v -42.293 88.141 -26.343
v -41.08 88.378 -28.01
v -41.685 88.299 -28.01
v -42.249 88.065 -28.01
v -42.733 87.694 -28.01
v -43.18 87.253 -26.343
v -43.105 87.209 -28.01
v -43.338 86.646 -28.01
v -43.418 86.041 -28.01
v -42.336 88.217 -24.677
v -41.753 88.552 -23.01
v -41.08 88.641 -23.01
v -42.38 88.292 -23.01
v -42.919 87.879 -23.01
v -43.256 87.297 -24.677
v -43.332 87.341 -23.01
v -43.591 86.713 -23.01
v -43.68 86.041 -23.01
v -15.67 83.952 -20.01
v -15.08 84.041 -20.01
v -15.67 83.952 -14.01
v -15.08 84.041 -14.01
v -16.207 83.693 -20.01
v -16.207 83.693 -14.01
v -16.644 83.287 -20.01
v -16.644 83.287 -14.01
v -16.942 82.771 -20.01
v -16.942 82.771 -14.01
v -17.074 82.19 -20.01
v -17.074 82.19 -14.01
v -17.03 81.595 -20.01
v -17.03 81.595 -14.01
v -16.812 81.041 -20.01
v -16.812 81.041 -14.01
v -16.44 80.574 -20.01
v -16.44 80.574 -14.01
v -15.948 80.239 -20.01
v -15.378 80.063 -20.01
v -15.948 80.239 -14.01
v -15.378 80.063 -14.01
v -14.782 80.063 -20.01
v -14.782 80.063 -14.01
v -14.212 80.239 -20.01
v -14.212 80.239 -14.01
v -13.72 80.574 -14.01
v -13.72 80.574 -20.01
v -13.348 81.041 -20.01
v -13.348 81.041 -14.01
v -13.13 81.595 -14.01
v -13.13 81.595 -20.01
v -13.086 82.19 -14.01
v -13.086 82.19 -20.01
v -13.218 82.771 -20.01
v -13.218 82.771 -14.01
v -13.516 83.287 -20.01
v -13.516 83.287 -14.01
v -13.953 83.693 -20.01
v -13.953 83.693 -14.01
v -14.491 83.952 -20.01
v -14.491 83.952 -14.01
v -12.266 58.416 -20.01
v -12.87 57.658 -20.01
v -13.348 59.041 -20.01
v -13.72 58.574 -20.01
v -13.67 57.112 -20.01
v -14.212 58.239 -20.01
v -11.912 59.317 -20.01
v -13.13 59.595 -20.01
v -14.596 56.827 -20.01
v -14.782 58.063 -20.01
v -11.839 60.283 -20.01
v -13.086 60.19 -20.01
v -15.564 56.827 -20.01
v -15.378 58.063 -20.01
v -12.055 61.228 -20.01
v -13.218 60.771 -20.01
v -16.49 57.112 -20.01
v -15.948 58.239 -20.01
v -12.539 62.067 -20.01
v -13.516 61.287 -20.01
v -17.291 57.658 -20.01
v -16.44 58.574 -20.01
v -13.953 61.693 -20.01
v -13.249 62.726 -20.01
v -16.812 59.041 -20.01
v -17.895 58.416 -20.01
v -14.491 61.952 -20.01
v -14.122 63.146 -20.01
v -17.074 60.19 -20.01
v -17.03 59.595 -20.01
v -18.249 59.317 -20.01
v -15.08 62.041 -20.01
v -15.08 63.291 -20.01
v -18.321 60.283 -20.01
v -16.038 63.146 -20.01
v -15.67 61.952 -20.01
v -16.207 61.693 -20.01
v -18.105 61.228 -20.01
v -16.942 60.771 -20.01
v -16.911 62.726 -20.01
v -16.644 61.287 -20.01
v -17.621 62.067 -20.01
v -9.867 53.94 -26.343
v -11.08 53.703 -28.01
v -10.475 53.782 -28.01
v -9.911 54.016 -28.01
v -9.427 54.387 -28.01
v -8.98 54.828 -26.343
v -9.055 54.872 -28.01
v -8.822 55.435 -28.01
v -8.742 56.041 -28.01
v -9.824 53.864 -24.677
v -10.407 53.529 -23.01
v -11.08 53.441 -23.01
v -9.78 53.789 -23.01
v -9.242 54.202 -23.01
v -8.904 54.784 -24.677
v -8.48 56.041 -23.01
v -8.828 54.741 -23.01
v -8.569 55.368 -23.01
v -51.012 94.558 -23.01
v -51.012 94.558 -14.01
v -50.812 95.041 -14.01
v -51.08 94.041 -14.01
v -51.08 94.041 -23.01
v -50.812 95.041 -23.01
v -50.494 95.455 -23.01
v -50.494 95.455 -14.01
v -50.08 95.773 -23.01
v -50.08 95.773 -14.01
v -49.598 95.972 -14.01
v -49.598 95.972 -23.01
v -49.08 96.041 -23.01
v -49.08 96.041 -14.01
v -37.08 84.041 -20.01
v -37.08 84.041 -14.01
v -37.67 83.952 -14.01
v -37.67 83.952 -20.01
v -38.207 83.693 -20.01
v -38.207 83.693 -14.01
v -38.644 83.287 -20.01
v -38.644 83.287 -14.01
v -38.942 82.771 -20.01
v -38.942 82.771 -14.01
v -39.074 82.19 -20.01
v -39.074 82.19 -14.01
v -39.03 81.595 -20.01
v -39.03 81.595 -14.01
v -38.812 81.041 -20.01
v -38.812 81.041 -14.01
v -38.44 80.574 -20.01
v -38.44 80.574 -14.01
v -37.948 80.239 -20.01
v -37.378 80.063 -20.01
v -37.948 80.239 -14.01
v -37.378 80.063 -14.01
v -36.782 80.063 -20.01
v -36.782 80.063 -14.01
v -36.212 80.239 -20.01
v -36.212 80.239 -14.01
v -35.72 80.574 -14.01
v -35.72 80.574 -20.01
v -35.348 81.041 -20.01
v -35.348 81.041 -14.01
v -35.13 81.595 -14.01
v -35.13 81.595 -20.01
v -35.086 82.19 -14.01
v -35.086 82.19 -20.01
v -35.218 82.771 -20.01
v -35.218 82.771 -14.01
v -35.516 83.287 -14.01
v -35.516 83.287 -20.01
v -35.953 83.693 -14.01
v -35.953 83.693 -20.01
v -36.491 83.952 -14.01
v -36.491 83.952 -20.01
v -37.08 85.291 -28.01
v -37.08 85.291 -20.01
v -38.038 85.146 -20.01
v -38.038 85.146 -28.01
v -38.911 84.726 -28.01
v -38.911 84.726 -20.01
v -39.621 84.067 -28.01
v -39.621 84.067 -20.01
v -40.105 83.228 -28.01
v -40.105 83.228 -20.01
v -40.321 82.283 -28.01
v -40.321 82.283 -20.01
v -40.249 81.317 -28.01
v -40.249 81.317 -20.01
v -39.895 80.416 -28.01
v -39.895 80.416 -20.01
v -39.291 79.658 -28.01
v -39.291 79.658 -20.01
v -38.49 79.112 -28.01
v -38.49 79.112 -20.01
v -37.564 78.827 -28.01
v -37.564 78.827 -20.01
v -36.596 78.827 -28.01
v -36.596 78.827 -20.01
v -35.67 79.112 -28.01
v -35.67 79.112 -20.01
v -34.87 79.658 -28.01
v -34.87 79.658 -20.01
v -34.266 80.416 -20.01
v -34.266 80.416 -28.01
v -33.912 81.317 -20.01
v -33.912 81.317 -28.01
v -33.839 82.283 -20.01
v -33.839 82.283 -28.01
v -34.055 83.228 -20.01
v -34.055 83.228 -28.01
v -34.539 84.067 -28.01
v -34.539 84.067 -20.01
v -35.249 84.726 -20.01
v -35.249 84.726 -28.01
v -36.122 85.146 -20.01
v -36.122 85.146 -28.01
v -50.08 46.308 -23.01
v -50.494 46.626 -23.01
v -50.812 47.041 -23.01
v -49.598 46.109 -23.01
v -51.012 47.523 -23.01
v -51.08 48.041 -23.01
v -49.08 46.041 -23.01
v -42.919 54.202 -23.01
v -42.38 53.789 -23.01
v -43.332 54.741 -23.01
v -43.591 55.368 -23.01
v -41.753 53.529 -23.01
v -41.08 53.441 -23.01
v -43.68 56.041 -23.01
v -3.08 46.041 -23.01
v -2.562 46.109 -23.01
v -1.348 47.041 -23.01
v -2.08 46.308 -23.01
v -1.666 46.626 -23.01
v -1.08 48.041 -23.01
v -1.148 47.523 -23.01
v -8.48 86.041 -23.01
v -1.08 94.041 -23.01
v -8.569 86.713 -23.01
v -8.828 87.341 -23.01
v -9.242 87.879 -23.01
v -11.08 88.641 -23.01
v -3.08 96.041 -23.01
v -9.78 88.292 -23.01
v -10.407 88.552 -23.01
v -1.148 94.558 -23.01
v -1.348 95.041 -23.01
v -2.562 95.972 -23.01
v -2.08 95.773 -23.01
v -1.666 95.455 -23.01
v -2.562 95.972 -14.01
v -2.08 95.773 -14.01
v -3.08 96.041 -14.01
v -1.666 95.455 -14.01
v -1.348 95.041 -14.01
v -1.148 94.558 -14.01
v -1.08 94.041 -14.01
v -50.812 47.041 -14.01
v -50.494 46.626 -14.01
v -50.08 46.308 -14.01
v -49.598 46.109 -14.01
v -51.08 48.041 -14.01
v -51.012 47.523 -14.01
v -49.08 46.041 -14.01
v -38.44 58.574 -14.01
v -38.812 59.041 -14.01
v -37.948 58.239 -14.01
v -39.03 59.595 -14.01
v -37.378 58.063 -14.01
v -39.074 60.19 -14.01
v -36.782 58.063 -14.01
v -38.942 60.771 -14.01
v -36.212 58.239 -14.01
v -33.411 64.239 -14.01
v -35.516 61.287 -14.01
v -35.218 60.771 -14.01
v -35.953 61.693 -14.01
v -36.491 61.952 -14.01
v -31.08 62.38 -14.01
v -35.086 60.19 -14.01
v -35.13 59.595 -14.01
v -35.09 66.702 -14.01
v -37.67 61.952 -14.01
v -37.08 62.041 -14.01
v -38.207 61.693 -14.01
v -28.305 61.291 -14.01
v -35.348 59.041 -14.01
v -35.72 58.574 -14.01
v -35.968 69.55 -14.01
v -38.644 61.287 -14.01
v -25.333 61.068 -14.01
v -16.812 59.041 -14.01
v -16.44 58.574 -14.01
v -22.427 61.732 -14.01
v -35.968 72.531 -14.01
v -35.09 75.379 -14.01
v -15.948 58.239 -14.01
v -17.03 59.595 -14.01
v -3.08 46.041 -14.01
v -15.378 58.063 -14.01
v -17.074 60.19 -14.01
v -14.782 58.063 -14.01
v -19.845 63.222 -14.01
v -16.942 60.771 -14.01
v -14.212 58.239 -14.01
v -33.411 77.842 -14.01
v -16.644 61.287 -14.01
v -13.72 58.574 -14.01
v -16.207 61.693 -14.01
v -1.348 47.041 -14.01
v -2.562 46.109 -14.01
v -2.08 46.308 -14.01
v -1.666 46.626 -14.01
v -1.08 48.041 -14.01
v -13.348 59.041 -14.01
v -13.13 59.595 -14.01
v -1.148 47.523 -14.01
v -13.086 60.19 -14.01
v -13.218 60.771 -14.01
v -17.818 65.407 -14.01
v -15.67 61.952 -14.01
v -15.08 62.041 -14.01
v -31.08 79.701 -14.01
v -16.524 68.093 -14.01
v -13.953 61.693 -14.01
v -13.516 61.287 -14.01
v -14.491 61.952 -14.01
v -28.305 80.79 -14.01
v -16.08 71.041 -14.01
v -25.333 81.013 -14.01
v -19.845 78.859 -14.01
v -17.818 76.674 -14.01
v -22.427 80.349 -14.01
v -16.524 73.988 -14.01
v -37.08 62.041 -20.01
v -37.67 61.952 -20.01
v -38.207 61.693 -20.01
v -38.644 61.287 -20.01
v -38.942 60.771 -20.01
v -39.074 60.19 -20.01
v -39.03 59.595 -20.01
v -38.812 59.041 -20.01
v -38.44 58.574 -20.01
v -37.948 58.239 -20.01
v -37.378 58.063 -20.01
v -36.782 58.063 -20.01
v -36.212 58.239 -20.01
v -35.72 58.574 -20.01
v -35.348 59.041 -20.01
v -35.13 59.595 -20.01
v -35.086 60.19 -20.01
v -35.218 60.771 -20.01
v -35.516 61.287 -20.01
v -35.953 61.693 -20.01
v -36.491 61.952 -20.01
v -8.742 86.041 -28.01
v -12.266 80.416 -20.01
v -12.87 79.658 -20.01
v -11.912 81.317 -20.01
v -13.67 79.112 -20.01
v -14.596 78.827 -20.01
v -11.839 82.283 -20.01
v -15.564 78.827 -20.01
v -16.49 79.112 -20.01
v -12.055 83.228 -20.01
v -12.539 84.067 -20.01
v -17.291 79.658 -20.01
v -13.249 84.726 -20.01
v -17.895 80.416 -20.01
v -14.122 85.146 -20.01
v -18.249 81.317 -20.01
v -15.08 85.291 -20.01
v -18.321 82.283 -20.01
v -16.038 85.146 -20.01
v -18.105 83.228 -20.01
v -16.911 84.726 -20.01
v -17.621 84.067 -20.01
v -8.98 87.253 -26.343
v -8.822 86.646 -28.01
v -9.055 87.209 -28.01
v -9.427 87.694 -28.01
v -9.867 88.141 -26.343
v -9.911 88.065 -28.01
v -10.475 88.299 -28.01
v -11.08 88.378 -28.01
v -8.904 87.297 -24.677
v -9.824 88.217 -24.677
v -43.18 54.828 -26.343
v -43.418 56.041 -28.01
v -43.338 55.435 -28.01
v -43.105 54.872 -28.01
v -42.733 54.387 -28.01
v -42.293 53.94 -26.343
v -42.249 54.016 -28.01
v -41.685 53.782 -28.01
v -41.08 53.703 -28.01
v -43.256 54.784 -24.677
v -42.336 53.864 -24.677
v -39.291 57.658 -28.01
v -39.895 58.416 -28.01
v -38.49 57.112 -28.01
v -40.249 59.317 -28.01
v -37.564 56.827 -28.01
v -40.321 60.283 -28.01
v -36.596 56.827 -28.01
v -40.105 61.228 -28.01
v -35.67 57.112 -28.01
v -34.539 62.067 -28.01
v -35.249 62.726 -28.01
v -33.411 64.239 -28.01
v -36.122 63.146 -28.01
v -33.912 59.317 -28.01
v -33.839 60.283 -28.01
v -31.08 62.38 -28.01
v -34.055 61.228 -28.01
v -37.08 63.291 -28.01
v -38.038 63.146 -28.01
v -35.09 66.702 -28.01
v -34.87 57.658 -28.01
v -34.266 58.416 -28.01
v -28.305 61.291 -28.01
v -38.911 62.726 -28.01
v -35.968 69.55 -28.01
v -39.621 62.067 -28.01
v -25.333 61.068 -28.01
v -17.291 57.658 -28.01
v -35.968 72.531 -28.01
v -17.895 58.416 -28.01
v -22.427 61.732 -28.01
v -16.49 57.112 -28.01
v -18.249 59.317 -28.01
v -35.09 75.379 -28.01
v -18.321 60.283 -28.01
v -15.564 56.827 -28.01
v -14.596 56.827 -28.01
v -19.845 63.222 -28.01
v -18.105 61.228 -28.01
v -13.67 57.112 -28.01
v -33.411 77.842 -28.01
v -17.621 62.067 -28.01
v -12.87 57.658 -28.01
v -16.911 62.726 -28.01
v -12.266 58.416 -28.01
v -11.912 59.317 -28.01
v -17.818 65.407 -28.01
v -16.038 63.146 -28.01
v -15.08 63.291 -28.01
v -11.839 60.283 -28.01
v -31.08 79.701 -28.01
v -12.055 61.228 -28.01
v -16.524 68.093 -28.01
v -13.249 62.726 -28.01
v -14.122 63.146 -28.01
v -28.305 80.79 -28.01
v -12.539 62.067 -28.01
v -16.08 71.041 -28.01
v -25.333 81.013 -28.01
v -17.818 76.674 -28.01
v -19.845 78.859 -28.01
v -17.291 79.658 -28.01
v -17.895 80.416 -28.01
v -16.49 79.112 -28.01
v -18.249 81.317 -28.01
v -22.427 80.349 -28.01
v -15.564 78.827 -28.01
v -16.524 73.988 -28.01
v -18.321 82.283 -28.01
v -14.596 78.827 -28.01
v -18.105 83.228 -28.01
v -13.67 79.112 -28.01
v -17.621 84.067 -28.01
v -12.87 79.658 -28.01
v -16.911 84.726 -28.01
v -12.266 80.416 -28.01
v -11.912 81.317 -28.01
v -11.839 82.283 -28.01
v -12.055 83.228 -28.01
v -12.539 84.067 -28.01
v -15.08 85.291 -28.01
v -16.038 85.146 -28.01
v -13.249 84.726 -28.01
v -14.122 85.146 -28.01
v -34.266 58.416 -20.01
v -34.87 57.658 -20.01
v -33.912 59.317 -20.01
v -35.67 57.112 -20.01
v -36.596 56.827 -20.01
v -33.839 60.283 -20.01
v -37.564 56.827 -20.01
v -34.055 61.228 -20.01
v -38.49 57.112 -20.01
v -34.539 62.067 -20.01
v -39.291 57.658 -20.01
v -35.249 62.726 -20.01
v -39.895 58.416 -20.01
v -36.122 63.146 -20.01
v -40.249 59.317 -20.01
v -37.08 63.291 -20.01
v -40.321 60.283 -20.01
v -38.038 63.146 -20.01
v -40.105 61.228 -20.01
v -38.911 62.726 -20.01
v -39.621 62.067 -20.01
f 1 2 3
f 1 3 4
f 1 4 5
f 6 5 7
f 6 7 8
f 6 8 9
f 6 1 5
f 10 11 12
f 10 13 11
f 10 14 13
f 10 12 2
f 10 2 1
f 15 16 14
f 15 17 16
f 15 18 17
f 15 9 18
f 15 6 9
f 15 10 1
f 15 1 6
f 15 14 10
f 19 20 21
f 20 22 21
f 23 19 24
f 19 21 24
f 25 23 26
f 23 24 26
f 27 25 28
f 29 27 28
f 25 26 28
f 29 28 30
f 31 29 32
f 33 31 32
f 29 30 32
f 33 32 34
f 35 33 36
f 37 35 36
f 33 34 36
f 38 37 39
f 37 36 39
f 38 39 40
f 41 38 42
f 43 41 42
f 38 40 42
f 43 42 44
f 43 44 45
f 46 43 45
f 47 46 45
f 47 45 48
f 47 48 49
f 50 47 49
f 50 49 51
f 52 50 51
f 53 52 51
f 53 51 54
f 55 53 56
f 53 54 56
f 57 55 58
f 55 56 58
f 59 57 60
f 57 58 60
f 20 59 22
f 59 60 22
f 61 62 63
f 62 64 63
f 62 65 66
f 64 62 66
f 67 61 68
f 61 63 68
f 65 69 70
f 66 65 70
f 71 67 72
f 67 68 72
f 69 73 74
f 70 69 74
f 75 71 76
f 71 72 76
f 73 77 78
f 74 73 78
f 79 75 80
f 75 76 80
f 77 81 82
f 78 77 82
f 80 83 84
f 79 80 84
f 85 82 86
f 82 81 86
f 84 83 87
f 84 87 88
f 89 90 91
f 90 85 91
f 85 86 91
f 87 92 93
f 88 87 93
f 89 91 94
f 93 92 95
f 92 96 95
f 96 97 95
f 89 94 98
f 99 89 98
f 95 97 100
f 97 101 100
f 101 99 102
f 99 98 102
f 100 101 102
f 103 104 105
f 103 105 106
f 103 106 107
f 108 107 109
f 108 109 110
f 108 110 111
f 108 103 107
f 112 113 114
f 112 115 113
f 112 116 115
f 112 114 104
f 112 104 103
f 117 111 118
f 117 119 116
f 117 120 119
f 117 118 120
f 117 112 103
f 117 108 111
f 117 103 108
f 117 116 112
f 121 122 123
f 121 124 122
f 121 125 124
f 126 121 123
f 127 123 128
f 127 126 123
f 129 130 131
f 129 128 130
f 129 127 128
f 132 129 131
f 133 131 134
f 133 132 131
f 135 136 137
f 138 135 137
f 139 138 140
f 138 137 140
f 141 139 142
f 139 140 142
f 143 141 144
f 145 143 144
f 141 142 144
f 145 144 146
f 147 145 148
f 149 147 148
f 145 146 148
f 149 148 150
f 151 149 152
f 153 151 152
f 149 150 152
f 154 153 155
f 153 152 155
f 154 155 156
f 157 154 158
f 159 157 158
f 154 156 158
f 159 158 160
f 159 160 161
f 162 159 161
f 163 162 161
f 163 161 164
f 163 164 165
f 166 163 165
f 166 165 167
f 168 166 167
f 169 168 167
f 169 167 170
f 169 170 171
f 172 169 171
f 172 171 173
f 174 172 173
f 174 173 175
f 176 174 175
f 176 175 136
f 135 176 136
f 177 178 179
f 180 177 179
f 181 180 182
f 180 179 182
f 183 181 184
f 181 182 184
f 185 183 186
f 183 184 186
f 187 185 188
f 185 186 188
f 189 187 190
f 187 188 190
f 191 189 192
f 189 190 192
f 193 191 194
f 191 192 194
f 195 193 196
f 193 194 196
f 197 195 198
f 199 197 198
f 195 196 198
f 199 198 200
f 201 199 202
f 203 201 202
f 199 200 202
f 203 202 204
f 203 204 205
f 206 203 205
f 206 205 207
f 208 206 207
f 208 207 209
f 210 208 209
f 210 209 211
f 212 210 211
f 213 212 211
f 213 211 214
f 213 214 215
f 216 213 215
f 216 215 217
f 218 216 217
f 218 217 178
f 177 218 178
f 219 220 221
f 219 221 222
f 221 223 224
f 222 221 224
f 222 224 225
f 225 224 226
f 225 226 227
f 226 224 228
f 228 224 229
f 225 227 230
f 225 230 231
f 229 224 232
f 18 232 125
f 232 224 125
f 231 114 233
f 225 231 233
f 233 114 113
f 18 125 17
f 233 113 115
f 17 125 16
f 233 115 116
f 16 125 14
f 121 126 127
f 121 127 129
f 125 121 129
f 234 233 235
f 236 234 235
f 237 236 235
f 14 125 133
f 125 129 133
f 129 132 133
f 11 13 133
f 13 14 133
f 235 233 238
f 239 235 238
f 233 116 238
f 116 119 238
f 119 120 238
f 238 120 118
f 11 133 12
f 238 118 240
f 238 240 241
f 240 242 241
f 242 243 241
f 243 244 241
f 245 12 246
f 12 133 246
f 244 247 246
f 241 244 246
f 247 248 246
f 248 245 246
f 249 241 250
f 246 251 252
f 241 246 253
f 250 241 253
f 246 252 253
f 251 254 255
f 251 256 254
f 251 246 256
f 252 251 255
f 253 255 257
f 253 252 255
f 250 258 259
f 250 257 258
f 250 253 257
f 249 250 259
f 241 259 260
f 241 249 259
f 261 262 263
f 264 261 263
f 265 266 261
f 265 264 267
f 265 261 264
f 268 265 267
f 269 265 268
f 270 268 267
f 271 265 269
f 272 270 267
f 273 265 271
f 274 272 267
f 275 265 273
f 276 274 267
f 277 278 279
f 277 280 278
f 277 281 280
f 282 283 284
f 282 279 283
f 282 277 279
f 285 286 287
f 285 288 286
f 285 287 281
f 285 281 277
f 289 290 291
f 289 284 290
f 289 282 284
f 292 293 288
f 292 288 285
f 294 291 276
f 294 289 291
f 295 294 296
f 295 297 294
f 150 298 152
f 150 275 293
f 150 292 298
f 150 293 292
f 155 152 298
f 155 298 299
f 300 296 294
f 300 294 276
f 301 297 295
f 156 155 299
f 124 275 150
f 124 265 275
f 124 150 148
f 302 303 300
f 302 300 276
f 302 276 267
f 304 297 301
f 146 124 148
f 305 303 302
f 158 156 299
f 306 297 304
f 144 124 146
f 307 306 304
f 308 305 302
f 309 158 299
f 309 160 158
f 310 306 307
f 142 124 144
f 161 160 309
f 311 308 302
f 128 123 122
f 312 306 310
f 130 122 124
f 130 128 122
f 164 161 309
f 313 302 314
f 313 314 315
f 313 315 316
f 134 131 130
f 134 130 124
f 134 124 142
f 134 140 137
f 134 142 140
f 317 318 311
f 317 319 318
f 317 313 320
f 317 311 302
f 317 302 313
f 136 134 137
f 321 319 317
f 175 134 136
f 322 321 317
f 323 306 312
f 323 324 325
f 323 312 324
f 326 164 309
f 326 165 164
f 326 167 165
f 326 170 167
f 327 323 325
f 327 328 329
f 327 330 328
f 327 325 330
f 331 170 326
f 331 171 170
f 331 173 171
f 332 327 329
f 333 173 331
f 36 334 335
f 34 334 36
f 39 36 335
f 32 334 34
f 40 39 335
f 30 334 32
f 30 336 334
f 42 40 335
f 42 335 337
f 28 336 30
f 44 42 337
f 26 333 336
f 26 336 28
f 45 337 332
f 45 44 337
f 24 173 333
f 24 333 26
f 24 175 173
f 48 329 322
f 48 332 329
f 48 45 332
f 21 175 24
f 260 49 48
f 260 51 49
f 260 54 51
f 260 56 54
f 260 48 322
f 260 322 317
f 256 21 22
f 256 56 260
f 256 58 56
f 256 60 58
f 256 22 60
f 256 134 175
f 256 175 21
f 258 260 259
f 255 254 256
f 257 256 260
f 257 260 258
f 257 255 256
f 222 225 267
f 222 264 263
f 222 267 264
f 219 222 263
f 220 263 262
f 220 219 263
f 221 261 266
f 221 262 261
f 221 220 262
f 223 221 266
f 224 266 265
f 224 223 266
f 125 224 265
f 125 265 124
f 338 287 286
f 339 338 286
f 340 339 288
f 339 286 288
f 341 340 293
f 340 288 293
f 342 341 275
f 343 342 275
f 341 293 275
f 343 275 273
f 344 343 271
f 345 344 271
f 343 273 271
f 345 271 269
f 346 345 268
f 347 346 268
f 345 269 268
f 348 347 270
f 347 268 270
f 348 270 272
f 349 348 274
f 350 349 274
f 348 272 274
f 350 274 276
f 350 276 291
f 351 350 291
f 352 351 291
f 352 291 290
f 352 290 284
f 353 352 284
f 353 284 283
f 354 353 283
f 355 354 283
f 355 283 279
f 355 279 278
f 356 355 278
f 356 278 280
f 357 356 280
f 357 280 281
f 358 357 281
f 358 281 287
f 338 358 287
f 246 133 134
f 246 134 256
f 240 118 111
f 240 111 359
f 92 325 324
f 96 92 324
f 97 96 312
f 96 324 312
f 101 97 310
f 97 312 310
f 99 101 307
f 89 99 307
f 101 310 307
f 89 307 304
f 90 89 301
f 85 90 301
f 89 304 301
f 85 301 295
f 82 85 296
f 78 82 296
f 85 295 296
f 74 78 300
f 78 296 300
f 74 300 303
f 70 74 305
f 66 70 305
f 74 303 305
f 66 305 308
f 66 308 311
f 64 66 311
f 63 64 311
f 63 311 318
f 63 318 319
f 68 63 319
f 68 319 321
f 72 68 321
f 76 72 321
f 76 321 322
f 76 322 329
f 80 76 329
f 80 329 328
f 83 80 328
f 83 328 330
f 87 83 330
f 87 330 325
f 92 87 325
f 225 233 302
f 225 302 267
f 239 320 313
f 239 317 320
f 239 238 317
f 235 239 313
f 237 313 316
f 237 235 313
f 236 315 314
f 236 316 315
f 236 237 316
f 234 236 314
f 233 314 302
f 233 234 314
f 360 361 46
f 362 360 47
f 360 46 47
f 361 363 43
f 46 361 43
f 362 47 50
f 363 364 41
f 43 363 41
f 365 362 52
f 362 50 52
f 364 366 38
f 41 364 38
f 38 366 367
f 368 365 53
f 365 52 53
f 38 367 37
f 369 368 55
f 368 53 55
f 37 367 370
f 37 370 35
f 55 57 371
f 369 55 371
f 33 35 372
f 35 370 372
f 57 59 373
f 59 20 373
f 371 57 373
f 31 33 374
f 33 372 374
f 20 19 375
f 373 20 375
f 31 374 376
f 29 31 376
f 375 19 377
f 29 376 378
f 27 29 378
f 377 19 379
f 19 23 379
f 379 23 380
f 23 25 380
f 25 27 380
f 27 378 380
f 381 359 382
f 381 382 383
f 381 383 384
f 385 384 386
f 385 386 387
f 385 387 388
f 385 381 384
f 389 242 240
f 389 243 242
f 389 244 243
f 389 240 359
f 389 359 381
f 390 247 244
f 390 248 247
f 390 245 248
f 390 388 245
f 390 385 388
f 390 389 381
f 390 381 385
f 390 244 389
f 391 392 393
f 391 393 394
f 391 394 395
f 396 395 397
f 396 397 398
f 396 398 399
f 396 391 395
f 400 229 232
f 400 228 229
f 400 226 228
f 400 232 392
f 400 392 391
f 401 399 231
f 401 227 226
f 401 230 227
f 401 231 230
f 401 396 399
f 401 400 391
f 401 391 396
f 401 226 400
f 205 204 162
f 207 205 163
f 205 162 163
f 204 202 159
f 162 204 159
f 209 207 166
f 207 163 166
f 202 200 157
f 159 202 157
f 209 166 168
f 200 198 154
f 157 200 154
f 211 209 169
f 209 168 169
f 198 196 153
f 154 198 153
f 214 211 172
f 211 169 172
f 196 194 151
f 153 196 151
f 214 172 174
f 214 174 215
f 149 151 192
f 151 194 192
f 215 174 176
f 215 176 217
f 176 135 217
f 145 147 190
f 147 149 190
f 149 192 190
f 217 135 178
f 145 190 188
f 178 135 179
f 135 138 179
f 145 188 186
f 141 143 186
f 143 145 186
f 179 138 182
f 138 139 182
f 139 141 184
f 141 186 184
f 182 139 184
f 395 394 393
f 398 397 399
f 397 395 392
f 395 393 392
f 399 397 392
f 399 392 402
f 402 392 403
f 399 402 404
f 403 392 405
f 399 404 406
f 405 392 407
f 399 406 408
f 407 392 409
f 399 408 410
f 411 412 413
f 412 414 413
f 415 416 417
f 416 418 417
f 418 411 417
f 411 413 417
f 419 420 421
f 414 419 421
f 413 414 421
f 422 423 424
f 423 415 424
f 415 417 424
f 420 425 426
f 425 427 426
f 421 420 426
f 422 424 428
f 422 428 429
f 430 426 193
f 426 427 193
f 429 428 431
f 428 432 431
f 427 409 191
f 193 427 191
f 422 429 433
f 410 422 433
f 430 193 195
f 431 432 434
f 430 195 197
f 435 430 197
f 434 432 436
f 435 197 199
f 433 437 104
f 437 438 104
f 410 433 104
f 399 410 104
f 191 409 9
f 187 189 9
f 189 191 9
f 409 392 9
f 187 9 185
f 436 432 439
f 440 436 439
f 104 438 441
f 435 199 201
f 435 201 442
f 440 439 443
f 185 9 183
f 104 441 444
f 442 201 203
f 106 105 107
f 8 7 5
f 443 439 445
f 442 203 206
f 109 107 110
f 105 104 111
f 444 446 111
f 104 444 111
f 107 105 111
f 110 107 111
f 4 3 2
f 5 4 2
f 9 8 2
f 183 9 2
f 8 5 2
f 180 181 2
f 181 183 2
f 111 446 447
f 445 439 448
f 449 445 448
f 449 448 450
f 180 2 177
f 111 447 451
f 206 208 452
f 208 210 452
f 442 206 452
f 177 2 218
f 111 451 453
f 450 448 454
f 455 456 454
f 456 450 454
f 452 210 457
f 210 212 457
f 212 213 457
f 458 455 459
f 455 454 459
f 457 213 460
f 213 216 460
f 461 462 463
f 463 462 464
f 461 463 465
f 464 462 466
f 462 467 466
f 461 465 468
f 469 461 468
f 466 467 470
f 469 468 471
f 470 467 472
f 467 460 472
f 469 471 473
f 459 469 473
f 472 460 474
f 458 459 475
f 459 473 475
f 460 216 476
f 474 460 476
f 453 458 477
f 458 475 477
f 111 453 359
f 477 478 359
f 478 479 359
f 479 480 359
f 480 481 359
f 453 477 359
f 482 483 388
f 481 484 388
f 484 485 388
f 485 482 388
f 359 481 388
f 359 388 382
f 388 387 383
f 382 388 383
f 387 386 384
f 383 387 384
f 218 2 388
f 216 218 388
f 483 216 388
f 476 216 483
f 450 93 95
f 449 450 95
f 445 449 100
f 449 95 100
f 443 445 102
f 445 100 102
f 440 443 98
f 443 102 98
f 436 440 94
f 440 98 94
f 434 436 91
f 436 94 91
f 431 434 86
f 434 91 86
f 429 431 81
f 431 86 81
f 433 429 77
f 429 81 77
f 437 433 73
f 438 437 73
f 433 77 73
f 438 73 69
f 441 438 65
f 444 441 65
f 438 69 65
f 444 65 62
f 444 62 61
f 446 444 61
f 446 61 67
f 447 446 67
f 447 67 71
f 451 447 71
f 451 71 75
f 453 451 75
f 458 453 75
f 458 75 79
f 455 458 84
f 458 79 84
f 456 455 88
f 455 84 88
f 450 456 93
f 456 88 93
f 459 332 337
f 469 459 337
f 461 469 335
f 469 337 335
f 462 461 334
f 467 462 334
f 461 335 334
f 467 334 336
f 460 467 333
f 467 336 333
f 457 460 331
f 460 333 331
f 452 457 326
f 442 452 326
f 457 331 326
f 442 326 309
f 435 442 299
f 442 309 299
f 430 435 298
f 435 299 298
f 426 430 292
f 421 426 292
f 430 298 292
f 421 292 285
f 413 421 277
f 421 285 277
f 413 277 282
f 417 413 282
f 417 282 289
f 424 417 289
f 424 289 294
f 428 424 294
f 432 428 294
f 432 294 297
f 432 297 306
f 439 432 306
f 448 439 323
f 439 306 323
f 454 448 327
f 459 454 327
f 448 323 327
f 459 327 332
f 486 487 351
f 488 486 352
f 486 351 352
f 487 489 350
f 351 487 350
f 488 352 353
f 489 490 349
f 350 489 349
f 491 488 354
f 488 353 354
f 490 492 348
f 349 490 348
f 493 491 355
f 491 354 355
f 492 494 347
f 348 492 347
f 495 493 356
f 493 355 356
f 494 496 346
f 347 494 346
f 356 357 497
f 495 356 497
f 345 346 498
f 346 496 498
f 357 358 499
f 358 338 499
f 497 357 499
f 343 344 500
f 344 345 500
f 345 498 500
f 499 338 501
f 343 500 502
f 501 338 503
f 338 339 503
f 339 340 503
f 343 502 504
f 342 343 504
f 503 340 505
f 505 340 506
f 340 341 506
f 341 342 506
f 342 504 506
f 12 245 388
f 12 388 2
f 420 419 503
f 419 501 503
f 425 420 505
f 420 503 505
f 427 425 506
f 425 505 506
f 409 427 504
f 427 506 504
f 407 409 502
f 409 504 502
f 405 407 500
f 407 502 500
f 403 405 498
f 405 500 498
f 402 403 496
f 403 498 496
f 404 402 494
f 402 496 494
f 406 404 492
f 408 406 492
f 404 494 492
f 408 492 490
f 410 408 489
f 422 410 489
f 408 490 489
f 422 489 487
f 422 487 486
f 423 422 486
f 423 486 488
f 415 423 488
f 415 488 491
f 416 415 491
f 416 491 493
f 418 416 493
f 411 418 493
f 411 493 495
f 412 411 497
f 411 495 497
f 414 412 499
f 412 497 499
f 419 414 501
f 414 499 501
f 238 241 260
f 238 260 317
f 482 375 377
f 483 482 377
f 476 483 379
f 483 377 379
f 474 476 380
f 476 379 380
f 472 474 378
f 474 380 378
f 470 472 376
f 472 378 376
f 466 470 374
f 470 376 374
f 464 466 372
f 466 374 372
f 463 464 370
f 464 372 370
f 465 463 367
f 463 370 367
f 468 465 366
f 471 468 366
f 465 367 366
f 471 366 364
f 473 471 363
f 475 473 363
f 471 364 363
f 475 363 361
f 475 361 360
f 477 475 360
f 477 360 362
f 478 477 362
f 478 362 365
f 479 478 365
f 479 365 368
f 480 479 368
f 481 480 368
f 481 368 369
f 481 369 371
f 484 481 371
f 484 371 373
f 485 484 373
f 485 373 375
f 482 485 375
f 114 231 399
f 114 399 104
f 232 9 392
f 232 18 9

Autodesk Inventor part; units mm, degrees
ref_plane "YZ Plane" through (0, 0, 0) normal (1, 0, 0) x (0, 1, 0)
ref_plane "XZ Plane" through (0, 0, 0) normal (0, 1, 0) x (-1, 0, 0)
ref_plane "XY Plane" through (0, 0, 0) normal (0, 0, 1) x (1, 0, 0)
ref_plane "Arbeitsebene15" through (-38.58009, 58.540516, -23.010083) normal (0, 0, 1) x (1, 0, 0)
sketch "Skizze38" plane through (-38.58009, 58.540516, -23.010083) normal (0, 0, 1) x (1, 0, 0)
  circle A0 centre (27, 33.3) radius 3
  circle A1 centre (-8.3, 27) radius 3
  circle A2 centre (-2, -8.3) radius 3
  circle A3 centre (33.3, -2) radius 3
  circle A4 centre (27, -8.3) radius 3
  circle A5 centre (-8.3, -2) radius 3
  circle A6 centre (-2, 33.3) radius 3
  circle A7 centre (33.3, 27) radius 3
  line L0 (27.5, 29.5) -> (-2.5, 29.5)
  arc A8 (29.5, 27.5) -> (27.5, 29.5) centre (27.5, 27.5) ccw
  line L1 (29.5, 27.5) -> (29.5, -2.5)
  arc A9 (27.5, -4.5) -> (29.5, -2.5) centre (27.5, -2.5) ccw
  line L2 (-2.5, -4.5) -> (27.5, -4.5)
  arc A10 (-4.5, -2.5) -> (-2.5, -4.5) centre (-2.5, -2.5) ccw
  line L3 (-4.5, -2.5) -> (-4.5, 27.5)
  arc A11 (-2.5, 29.5) -> (-4.5, 27.5) centre (-2.5, 27.5) ccw
  circle A12 centre (33.5, 33.5) radius 2.5
  circle A13 centre (-8.5, -8.5) radius 2.5
  circle A14 centre (33.5, -8.5) radius 2.5
  circle A15 centre (-8.5, 33.5) radius 2.5
  line L4 (-11.75, -10.5) -> (-11.75, 8.25)
  arc A16 (-11.75, -10.5) -> (-10.5, -11.75) centre (-10.5, -10.5) ccw
  line L5 (8.25, -11.75) -> (-10.5, -11.75)
  line L6 (8.25, -13.877389) -> (8.25, -11.75)
  arc A17 (7.405556, -14.865216) -> (8.25, -13.877389) centre (7.25, -13.877389) ccw
  arc A18 (7.405556, -14.865216) -> (7.6, -17.35) centre (7.6, -16.1) ccw
  line L7 (17.4, -17.35) -> (7.6, -17.35)
  arc A19 (17.4, -17.35) -> (17.594444, -14.865216) centre (17.4, -16.1) ccw
  arc A20 (16.75, -13.877389) -> (17.594444, -14.865216) centre (17.75, -13.877389) ccw
  line L8 (16.75, -11.75) -> (16.75, -13.877389)
  line L9 (35.5, -11.75) -> (16.75, -11.75)
  arc A21 (35.5, -11.75) -> (36.75, -10.5) centre (35.5, -10.5) ccw
  line L10 (36.75, 6.487451) -> (36.75, -10.5)
  arc A22 (36.75, 6.487451) -> (36.55605, 6.521706) centre (36.65, 6.487451) ccw
  arc A23 (31.3, 7.45) -> (36.55605, 6.521706) centre (34.01, 7.45) ccw
  line L11 (31.3, 17.55) -> (31.3, 7.45)
  arc A24 (36.55605, 18.478294) -> (31.3, 17.55) centre (34.01, 17.55) ccw
  arc A25 (36.55605, 18.478294) -> (36.75, 18.512549) centre (36.65, 18.512549) ccw
  line L12 (36.75, 35.5) -> (36.75, 18.512549)
  arc A26 (36.75, 35.5) -> (35.5, 36.75) centre (35.5, 35.5) ccw
  line L13 (18.512549, 36.75) -> (35.5, 36.75)
  arc A27 (18.512549, 36.75) -> (18.478294, 36.55605) centre (18.512549, 36.65) ccw
  arc A28 (17.55, 31.3) -> (18.478294, 36.55605) centre (17.55, 34.01) ccw
  line L14 (7.45, 31.3) -> (17.55, 31.3)
  arc A29 (6.521706, 36.55605) -> (7.45, 31.3) centre (7.45, 34.01) ccw
  arc A30 (6.521706, 36.55605) -> (6.487451, 36.75) centre (6.487451, 36.65) ccw
  line L15 (-10.5, 36.75) -> (6.487451, 36.75)
  arc A31 (-10.5, 36.75) -> (-11.75, 35.5) centre (-10.5, 35.5) ccw
  line L16 (-11.75, 16.75) -> (-11.75, 35.5)
  line L17 (-13.877389, 16.75) -> (-11.75, 16.75)
  arc A32 (-14.865216, 17.594444) -> (-13.877389, 16.75) centre (-13.877389, 17.75) ccw
  arc A33 (-14.865216, 17.594444) -> (-17.35, 17.4) centre (-16.1, 17.4) ccw
  line L18 (-17.35, 7.6) -> (-17.35, 17.4)
  arc A34 (-17.35, 7.6) -> (-14.865216, 7.405556) centre (-16.1, 7.6) ccw
  arc A35 (-13.877389, 8.25) -> (-14.865216, 7.405556) centre (-13.877389, 7.25) ccw
  line L19 (-11.75, 8.25) -> (-13.877389, 8.25)
  line L20 (-2.5, 30.1) -> (27.5, 30.1)
  arc A36 (30.1, 27.5) -> (27.5, 30.1) centre (27.5, 27.5) ccw
  line L21 (30.1, 27.5) -> (30.1, -2.5)
  arc A37 (27.5, -5.1) -> (30.1, -2.5) centre (27.5, -2.5) ccw
  line L22 (27.5, -5.1) -> (-2.5, -5.1)
  arc A38 (-5.1, -2.5) -> (-2.5, -5.1) centre (-2.5, -2.5) ccw
  line L23 (-5.1, -2.5) -> (-5.1, 27.5)
  arc A39 (-2.5, 30.1) -> (-5.1, 27.5) centre (-2.5, 27.5) ccw
  point P0 (38.58009, -58.540516)
  dimension "d425" = 0.6
sketch "Skizze38 outline for Extrusion20" plane through (-38.58009, 58.540516, -23.010083) normal (0, 0, 1) x (1, 0, 0)
  arc A0 (-5.1, -2.5) -> (-2.5, -5.1) centre (-2.5, -2.5) ccw
  line L0 (-5.1, 27.5) -> (-5.1, -2.5)
  arc A1 (-2.5, 30.1) -> (-5.1, 27.5) centre (-2.5, 27.5) ccw
  line L1 (27.5, 30.1) -> (-2.5, 30.1)
  arc A2 (30.1, 27.5) -> (27.5, 30.1) centre (27.5, 27.5) ccw
  line L2 (30.1, -2.5) -> (30.1, 27.5)
  arc A3 (27.5, -5.1) -> (30.1, -2.5) centre (27.5, -2.5) ccw
  line L3 (-2.5, -5.1) -> (27.5, -5.1)
extrude "Extrusion20" add sketch "Skizze38 outline for Extrusion20" against normal blind 5 draft -3
sketch "Skizze39" plane through (-38.58009, 58.540516, -23.010083) normal (0, 0, 1) x (1, 0, 0)
  line L0 (-2.5, -5.1) -> (27.5, -5.1) projected
  arc A0 (27.5, -5.1) -> (30.1, -2.5) centre (27.5, -2.5) ccw projected
  line L1 (30.1, -2.5) -> (30.1, 27.5) projected
  arc A1 (30.1, 27.5) -> (27.5, 30.1) centre (27.5, 27.5) ccw projected
  line L2 (27.5, 30.1) -> (-2.5, 30.1) projected
  arc A2 (-2.5, 30.1) -> (-5.1, 27.5) centre (-2.5, 27.5) ccw projected
  line L3 (-5.1, 27.5) -> (-5.1, -2.5) projected
  arc A3 (-5.1, -2.5) -> (-2.5, -5.1) centre (-2.5, -2.5) ccw projected
  line L4 (17.5, -12.5) -> (35.5, -12.5) projected
  line L5 (-10.5, 37.5) -> (35.5, 37.5)
  line L6 (37.5, 35.5) -> (37.5, -10.5)
  line L7 (35.5, -12.5) -> (-10.5, -12.5)
  line L8 (-12.5, -10.5) -> (-12.5, 35.5)
  line L9 (-12.5, 37.5) -> (37.5, -12.5) construction
  line L10 (37.5, 37.5) -> (-12.5, -12.5) construction
  arc A4 (37.5, 35.5) -> (35.5, 37.5) centre (35.5, 35.5) ccw projected
  arc A5 (37.5, 35.5) -> (35.5, 37.5) centre (35.5, 35.5) ccw
  arc A6 (-10.5, 37.5) -> (-12.5, 35.5) centre (-10.5, 35.5) ccw
  arc A7 (-12.5, -10.5) -> (-10.5, -12.5) centre (-10.5, -10.5) ccw
  arc A8 (35.5, -12.5) -> (37.5, -10.5) centre (35.5, -10.5) ccw
  point P0 (38.58009, -58.540516)
  point P1 (12.5, 12.5)
  point P2 (35.5, -12.5)
  dimension "d428" = 50
  dimension "d429" = 50
  dimension "d430" = 2
extrude "Extrusion21" add sketch "Skizze39" along normal blind 9 contours A3 L3 A2 L2 A1 L1 A0 L0 | L7 A7 L8 A6 L5 A4 L6 A8 L4
sketch "Skizze40" plane through (-38.58009, 58.540516, -14.010083) normal (0, 0, 1) x (1, 0, 0)
  arc A0 (-10.5, 37.5) -> (-12.5, 35.5) centre (-10.5, 35.5) ccw projected
  line L0 (-12.5, 35.5) -> (-12.5, -10.5) projected
  arc A1 (-12.5, -10.5) -> (-10.5, -12.5) centre (-10.5, -10.5) ccw projected
  line L1 (-10.5, -12.5) -> (35.5, -12.5) projected
  arc A2 (35.5, -12.5) -> (37.5, -10.5) centre (35.5, -10.5) ccw projected
  line L2 (37.5, -10.5) -> (37.5, 35.5) projected
  arc A3 (37.5, 35.5) -> (35.5, 37.5) centre (35.5, 35.5) ccw projected
  line L3 (35.5, 37.5) -> (-10.5, 37.5) projected
  circle A4 centre (12.5, 12.5) radius 10
  line L4 (1.5, 23.5) -> (23.5, 23.5)
  line L5 (23.5, 23.5) -> (23.5, 1.5)
  line L6 (23.5, 1.5) -> (1.5, 1.5)
  line L7 (1.5, 1.5) -> (1.5, 23.5)
  line L8 (1.5, 23.5) -> (23.5, 1.5) construction
  line L9 (23.5, 23.5) -> (1.5, 1.5) construction
  circle A5 centre (1.5, 1.5) radius 1.6
  circle A6 centre (1.5, 23.5) radius 1.6
  circle A7 centre (23.5, 23.5) radius 1.6
  circle A8 centre (23.5, 1.5) radius 1.6
  dimension "d466" = 20
  dimension "d467" = 22
  dimension "d468" = 22
  dimension "d469" = 3.2
  dimension "d470" = 3.2
  dimension "d471" = 3.2
  dimension "d472" = 3.2
extrude "Extrusion22" cut sketch "Skizze40" against normal through all contours A4 | L7 A6 L4 | L4 A6 L7 | A7 L5 L4 | L4 L5 A7 | A5 L6 L7 | L7 L6 A5 | A8 L6 L5 | L5 L6 A8
sketch "Skizze43" plane through (-38.58009, 58.540516, -28.010083) normal (0, 0, -1) x (-1, 0, 0)
  circle A0 centre (-1.5, 23.5) radius 1.6
  circle A1 centre (-1.5, 1.5) radius 1.6
  circle A2 centre (-23.5, 23.5) radius 1.6
  circle A3 centre (-12.5, 12.5) radius 10
  circle A4 centre (-23.5, 1.5) radius 1.6
  line L0 (2.5, -4.837961) -> (-27.5, -4.837961)
  arc A5 (2.5, -4.837961) -> (4.837961, -2.5) centre (2.5, -2.5) ccw
  line L1 (4.837961, 27.5) -> (4.837961, -2.5)
  arc A6 (4.837961, 27.5) -> (2.5, 29.837961) centre (2.5, 27.5) ccw
  line L2 (-27.5, 29.837961) -> (2.5, 29.837961)
  arc A7 (-27.5, 29.837961) -> (-29.837961, 27.5) centre (-27.5, 27.5) ccw
  line L3 (-29.837961, -2.5) -> (-29.837961, 27.5)
  arc A8 (-29.837961, -2.5) -> (-27.5, -4.837961) centre (-27.5, -2.5) ccw
  circle A9 centre (-23.5, 1.5) radius 1.6
  circle A10 centre (-1.5, 23.5) radius 1.6
  circle A11 centre (-1.5, 1.5) radius 1.6
  point P0 (-38.58009, -58.540516)
  point P1 (-23.5, 1.5)
  point P2 (-23.5, 23.5)
  point P3 (-1.5, 23.5)
  point P4 (-1.5, 1.5)
hole "Bohrung11" at (-15.08009, 60.040516, -28.010083) at (-15.08009, 82.040516, -28.010083) at (-37.08009, 82.040516, -28.010083) at (-37.08009, 60.040516, -28.010083) direction (0, 0, 1) diameter 4 end through all counterbore diameter 6.5 counterbore depth 8
equation "\"d_i\" = 40"
equation "\"d_o\" = 40"
equation "\"d_part\" = 50"
equation "\"d6\" = 0"
equation "\"d7\" = 0"
equation "\"d8\" = 0"
equation "\"d9\" = 0"
equation "\"d13\" = 0"
equation "\"d14\" = 0"
equation "\"d20\" = 0"
equation "\"d21\" = 0"
equation "\"d22\" = 0"
equation "\"d23\" = 0"
equation "\"d24\" = 0"
equation "\"d25\" = 3"
equation "\"d26\" = 0"
equation "\"d27\" = 0"
equation "\"d28\" = 0"
equation "\"d29\" = 0"
equation "\"d30\" = 0"
equation "\"d31\" = 0"
equation "\"d32\" = 0"
equation "\"d33\" = 0"
equation "\"d34\" = 0"
equation "\"d46\" = 0"
equation "\"d47\" = 0"
equation "\"d48\" = 0"
equation "\"d50\" = 0"
equation "\"d51\" = 0"
equation "\"d52\" = 0"
equation "\"d53\" = 0"
equation "\"d54\" = 0"
equation "\"d55\" = 0"
equation "\"d56\" = 0"
equation "\"d57\" = 0"
equation "\"d58\" = 0"
equation "\"d59\" = 0"
equation "\"magnet_offset\" = 0"
equation "\"screw_offset\" = 0"
equation "\"mal_puzzle_offset\" = 0"
equation "\"fem_puzzle_offset\" = 0"
properties part number "20_Cube_Adapter_Zstage_motorized"
